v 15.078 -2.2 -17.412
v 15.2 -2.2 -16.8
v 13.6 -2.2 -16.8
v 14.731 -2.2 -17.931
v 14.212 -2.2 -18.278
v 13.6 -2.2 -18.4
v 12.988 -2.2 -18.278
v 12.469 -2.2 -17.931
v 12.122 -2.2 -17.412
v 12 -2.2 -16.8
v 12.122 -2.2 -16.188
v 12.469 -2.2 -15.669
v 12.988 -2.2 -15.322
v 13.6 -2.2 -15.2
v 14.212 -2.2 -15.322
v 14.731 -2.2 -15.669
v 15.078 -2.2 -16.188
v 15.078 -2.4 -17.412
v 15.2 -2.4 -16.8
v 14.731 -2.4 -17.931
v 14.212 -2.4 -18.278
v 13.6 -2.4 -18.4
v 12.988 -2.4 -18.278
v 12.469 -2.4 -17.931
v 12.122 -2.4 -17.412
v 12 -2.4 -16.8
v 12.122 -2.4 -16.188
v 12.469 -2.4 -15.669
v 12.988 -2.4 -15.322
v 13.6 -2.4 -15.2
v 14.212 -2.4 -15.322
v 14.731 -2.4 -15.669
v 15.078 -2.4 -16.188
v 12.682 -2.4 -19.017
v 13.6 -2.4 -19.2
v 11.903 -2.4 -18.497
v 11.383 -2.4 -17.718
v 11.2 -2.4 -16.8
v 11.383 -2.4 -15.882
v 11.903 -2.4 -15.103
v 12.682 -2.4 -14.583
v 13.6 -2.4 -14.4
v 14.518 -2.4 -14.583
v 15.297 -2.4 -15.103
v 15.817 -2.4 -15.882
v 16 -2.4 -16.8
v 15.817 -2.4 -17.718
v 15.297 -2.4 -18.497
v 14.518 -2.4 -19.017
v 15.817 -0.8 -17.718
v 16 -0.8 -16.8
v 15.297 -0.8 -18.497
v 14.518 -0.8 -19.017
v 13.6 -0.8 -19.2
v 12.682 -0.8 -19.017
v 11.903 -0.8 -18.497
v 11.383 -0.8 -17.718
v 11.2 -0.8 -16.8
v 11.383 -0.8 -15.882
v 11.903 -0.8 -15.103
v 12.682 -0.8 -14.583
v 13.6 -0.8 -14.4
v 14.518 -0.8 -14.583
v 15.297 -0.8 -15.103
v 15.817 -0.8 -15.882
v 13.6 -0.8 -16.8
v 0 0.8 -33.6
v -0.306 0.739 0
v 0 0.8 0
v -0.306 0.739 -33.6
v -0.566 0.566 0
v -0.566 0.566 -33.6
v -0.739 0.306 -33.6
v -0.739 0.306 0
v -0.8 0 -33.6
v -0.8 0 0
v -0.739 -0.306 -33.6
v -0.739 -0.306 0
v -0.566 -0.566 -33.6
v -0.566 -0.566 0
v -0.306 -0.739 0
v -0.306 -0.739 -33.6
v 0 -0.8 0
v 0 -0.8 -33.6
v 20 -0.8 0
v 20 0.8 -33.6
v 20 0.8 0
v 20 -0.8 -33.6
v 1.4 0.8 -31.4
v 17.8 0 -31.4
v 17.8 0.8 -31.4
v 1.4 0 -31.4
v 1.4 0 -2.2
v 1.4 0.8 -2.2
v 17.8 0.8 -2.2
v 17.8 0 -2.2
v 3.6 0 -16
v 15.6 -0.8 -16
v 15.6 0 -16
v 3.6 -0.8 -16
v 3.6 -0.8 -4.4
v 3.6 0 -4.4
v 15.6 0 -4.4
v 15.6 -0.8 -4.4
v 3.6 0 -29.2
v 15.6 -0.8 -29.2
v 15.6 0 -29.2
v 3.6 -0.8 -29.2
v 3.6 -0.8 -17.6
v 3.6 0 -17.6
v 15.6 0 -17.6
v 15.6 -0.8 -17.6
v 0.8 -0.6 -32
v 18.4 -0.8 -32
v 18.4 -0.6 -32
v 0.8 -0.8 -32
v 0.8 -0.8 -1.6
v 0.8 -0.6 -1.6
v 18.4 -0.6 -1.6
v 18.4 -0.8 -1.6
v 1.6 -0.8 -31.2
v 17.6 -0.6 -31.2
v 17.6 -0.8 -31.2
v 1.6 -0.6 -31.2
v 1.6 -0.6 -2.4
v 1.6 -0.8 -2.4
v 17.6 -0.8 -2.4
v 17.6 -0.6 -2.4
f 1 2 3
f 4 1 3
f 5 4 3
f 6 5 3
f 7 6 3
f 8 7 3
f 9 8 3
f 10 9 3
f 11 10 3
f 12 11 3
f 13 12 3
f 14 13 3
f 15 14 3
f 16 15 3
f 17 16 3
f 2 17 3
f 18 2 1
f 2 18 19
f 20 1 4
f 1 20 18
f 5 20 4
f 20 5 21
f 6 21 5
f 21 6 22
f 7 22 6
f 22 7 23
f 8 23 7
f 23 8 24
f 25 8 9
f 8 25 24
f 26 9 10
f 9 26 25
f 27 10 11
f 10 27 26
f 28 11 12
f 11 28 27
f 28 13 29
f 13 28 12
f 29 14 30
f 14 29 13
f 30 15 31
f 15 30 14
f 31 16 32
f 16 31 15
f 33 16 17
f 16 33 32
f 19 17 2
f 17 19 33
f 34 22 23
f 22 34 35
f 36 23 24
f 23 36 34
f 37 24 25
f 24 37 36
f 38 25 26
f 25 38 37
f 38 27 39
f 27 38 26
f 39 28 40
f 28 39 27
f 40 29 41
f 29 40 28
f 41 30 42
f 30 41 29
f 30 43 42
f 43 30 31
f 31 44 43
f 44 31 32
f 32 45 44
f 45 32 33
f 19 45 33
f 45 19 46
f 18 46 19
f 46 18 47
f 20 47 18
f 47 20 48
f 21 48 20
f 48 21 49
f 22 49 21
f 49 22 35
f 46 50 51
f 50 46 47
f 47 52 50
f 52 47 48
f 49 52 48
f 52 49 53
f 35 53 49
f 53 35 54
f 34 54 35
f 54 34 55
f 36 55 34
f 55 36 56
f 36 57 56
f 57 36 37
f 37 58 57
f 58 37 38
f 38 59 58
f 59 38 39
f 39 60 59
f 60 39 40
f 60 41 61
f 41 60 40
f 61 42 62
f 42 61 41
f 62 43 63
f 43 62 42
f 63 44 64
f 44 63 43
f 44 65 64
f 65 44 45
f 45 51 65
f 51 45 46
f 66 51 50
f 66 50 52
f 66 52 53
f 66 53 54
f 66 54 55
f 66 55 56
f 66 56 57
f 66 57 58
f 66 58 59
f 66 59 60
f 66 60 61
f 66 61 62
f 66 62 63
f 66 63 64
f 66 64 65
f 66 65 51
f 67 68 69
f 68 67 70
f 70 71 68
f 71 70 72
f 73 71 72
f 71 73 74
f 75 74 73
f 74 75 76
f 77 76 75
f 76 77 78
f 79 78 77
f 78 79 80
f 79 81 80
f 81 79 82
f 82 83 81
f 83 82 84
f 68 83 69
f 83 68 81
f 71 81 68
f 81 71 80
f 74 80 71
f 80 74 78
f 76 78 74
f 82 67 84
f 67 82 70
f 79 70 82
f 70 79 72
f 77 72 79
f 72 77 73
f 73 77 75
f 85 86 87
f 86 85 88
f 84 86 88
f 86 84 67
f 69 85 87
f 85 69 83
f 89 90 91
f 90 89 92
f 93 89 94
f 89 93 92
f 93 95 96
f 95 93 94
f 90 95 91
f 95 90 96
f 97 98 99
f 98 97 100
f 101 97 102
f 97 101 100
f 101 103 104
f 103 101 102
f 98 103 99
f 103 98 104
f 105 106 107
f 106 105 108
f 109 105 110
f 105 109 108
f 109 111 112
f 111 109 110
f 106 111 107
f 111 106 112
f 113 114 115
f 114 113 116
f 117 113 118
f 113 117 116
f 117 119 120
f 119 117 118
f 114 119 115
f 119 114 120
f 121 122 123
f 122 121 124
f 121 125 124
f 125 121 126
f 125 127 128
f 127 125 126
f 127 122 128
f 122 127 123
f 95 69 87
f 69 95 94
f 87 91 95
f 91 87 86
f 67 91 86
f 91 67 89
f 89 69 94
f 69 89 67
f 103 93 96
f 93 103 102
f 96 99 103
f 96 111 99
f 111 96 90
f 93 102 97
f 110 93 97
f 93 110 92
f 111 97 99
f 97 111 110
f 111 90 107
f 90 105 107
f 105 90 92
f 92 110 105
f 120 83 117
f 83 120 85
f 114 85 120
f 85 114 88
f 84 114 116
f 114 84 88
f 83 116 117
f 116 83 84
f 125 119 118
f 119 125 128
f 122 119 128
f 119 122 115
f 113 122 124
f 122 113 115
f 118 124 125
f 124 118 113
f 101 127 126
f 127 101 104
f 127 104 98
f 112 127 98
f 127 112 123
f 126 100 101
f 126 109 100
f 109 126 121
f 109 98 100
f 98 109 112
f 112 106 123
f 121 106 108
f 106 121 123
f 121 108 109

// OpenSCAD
// file: ../p/4-4edge.scad
use <../lib.scad>
function ldraw_lib__4_4edge() = [
// 0 Circle 1.0
// 0 Name: 4-4edge.dat
// 0 Author: James Jessiman
// 0 !LDRAW_ORG Primitive UPDATE 2017-01
// 0 !LICENSE Licensed under CC BY 4.0 : see CAreadme.txt
// 
// 0 BFC CERTIFY CCW
  [0,"BFC","CERTIFY"],
  [0,"BFC","CCW"],
// 
// 0 !HISTORY 1998-12-15 [PTadmin] Official Update 1998-10
// 0 !HISTORY 2005-12-28 [PTadmin] Official Update 2005-01
// 0 !HISTORY 2007-06-24 [PTadmin] Header formatted for Contributor Agreement
// 0 !HISTORY 2008-07-01 [PTadmin] Official Update 2008-01
// 0 !HISTORY 2017-01-15 [Steffen] BFCed
// 0 !HISTORY 2017-12-30 [PTadmin] Official Update 2017-01
// 
// 
// 2 24 1 0 0 0.9239 0 0.3827
  [2,24,1,0,0,0.9239,0,0.3827],
// 2 24 0.9239 0 0.3827 0.7071 0 0.7071
  [2,24,0.9239,0,0.3827,0.7071,0,0.7071],
// 2 24 0.7071 0 0.7071 0.3827 0 0.9239
  [2,24,0.7071,0,0.7071,0.3827,0,0.9239],
// 2 24 0.3827 0 0.9239 0 0 1
  [2,24,0.3827,0,0.9239,0,0,1],
// 2 24 0 0 1 -0.3827 0 0.9239
  [2,24,0,0,1,-0.3827,0,0.9239],
// 2 24 -0.3827 0 0.9239 -0.7071 0 0.7071
  [2,24,-0.3827,0,0.9239,-0.7071,0,0.7071],
// 2 24 -0.7071 0 0.7071 -0.9239 0 0.3827
  [2,24,-0.7071,0,0.7071,-0.9239,0,0.3827],
// 2 24 -0.9239 0 0.3827 -1 0 -0
  [2,24,-0.9239,0,0.3827,-1,0,-0],
// 2 24 -1 0 -0 -0.9239 0 -0.3827
  [2,24,-1,0,-0,-0.9239,0,-0.3827],
// 2 24 -0.9239 0 -0.3827 -0.7071 0 -0.7071
  [2,24,-0.9239,0,-0.3827,-0.7071,0,-0.7071],
// 2 24 -0.7071 0 -0.7071 -0.3827 0 -0.9239
  [2,24,-0.7071,0,-0.7071,-0.3827,0,-0.9239],
// 2 24 -0.3827 0 -0.9239 0 0 -1
  [2,24,-0.3827,0,-0.9239,0,0,-1],
// 2 24 0 0 -1 0.3827 0 -0.9239
  [2,24,0,0,-1,0.3827,0,-0.9239],
// 2 24 0.3827 0 -0.9239 0.7071 0 -0.7071
  [2,24,0.3827,0,-0.9239,0.7071,0,-0.7071],
// 2 24 0.7071 0 -0.7071 0.9239 0 -0.3827
  [2,24,0.7071,0,-0.7071,0.9239,0,-0.3827],
// 2 24 0.9239 0 -0.3827 1 0 0
  [2,24,0.9239,0,-0.3827,1,0,0],
];
module ldraw_lib__4_4edge(step=0, col=false, unit=2/5, alt=false, line=0.2, solid=!$preview)
    makepoly(ldraw_lib__4_4edge(), step=step, col=col, unit=unit, alt=alt, line=line, solid=solid);
ldraw_lib__4_4edge(line=0.2);
// file: ../p/4-4cyli.scad
use <../lib.scad>
function ldraw_lib__4_4cyli() = [
// 0 Cylinder 1.0
// 0 Name: 4-4cyli.dat
// 0 Author: James Jessiman
// 0 !LDRAW_ORG Primitive UPDATE 2005-01
// 0 !LICENSE Licensed under CC BY 4.0 : see CAreadme.txt
// 
// 0 BFC CERTIFY CCW
  [0,"BFC","CERTIFY"],
  [0,"BFC","CCW"],
// 
// 0 !HISTORY 1998-12-15 [PTadmin] Official Update 1998-10
// 0 !HISTORY 2002-03-23 [sbliss] Added BFC statement; merged headers from files in distributions LDraw 0.27 and Complete.
// 0 !HISTORY 2002-04-25 [PTadmin] Official Update 2002-02
// 0 !HISTORY 2004-12-14 [guyvivan] BFC CCW
// 0 !HISTORY 2005-12-28 [PTadmin] Official Update 2005-01
// 0 !HISTORY 2007-06-24 [PTadmin] Header formatted for Contributor Agreement
// 0 !HISTORY 2008-07-01 [PTadmin] Official Update 2008-01
// 
// 
// 4 16 1 1 0 0.9239 1 0.3827 0.9239 0 0.3827 1 0 0
  [4,16,1,1,0,0.9239,1,0.3827,0.9239,0,0.3827,1,0,0],
// 5 24 1 0 0 1 1 0 0.9239 0 0.3827 0.9239 0 -0.3827
  [5,24,1,0,0,1,1,0,0.9239,0,0.3827,0.9239,0,-0.3827],
// 4 16 0.9239 1 0.3827 0.7071 1 0.7071 0.7071 0 0.7071 0.9239 0 0.3827
  [4,16,0.9239,1,0.3827,0.7071,1,0.7071,0.7071,0,0.7071,0.9239,0,0.3827],
// 5 24 0.9239 0 0.3827 0.9239 1 0.3827 0.7071 0 0.7071 1 0 0
  [5,24,0.9239,0,0.3827,0.9239,1,0.3827,0.7071,0,0.7071,1,0,0],
// 4 16 0.7071 1 0.7071 0.3827 1 0.9239 0.3827 0 0.9239 0.7071 0 0.7071
  [4,16,0.7071,1,0.7071,0.3827,1,0.9239,0.3827,0,0.9239,0.7071,0,0.7071],
// 5 24 0.7071 0 0.7071 0.7071 1 0.7071 0.3827 0 0.9239 0.9239 0 0.3827
  [5,24,0.7071,0,0.7071,0.7071,1,0.7071,0.3827,0,0.9239,0.9239,0,0.3827],
// 4 16 0.3827 1 0.9239 0 1 1 0 0 1 0.3827 0 0.9239
  [4,16,0.3827,1,0.9239,0,1,1,0,0,1,0.3827,0,0.9239],
// 5 24 0.3827 0 0.9239 0.3827 1 0.9239 0 0 1 0.7071 0 0.7071
  [5,24,0.3827,0,0.9239,0.3827,1,0.9239,0,0,1,0.7071,0,0.7071],
// 4 16 0 1 1 -0.3827 1 0.9239 -0.3827 0 0.9239 0 0 1
  [4,16,0,1,1,-0.3827,1,0.9239,-0.3827,0,0.9239,0,0,1],
// 5 24 0 0 1 0 1 1 -0.3827 0 0.9239 0.3827 0 0.9239
  [5,24,0,0,1,0,1,1,-0.3827,0,0.9239,0.3827,0,0.9239],
// 4 16 -0.3827 1 0.9239 -0.7071 1 0.7071 -0.7071 0 0.7071 -0.3827 0 0.9239
  [4,16,-0.3827,1,0.9239,-0.7071,1,0.7071,-0.7071,0,0.7071,-0.3827,0,0.9239],
// 5 24 -0.3827 0 0.9239 -0.3827 1 0.9239 -0.7071 0 0.7071 0 0 1
  [5,24,-0.3827,0,0.9239,-0.3827,1,0.9239,-0.7071,0,0.7071,0,0,1],
// 4 16 -0.7071 1 0.7071 -0.9239 1 0.3827 -0.9239 0 0.3827 -0.7071 0 0.7071
  [4,16,-0.7071,1,0.7071,-0.9239,1,0.3827,-0.9239,0,0.3827,-0.7071,0,0.7071],
// 5 24 -0.7071 0 0.7071 -0.7071 1 0.7071 -0.9239 0 0.3827 -0.3827 0 0.9239
  [5,24,-0.7071,0,0.7071,-0.7071,1,0.7071,-0.9239,0,0.3827,-0.3827,0,0.9239],
// 4 16 -0.9239 1 0.3827 -1 1 0 -1 0 0 -0.9239 0 0.3827
  [4,16,-0.9239,1,0.3827,-1,1,0,-1,0,0,-0.9239,0,0.3827],
// 5 24 -0.9239 0 0.3827 -0.9239 1 0.3827 -1 0 0 -0.7071 0 0.7071
  [5,24,-0.9239,0,0.3827,-0.9239,1,0.3827,-1,0,0,-0.7071,0,0.7071],
// 4 16 -1 1 0 -0.9239 1 -0.3827 -0.9239 0 -0.3827 -1 0 0
  [4,16,-1,1,0,-0.9239,1,-0.3827,-0.9239,0,-0.3827,-1,0,0],
// 5 24 -1 0 0 -1 1 0 -0.9239 0 -0.3827 -0.9239 0 0.3827
  [5,24,-1,0,0,-1,1,0,-0.9239,0,-0.3827,-0.9239,0,0.3827],
// 4 16 -0.9239 1 -0.3827 -0.7071 1 -0.7071 -0.7071 0 -0.7071 -0.9239 0 -0.3827
  [4,16,-0.9239,1,-0.3827,-0.7071,1,-0.7071,-0.7071,0,-0.7071,-0.9239,0,-0.3827],
// 5 24 -0.9239 0 -0.3827 -0.9239 1 -0.3827 -0.7071 0 -0.7071 -1 0 0
  [5,24,-0.9239,0,-0.3827,-0.9239,1,-0.3827,-0.7071,0,-0.7071,-1,0,0],
// 4 16 -0.7071 1 -0.7071 -0.3827 1 -0.9239 -0.3827 0 -0.9239 -0.7071 0 -0.7071
  [4,16,-0.7071,1,-0.7071,-0.3827,1,-0.9239,-0.3827,0,-0.9239,-0.7071,0,-0.7071],
// 5 24 -0.7071 0 -0.7071 -0.7071 1 -0.7071 -0.3827 0 -0.9239 -0.9239 0 -0.3827
  [5,24,-0.7071,0,-0.7071,-0.7071,1,-0.7071,-0.3827,0,-0.9239,-0.9239,0,-0.3827],
// 4 16 -0.3827 1 -0.9239 0 1 -1 0 0 -1 -0.3827 0 -0.9239
  [4,16,-0.3827,1,-0.9239,0,1,-1,0,0,-1,-0.3827,0,-0.9239],
// 5 24 -0.3827 0 -0.9239 -0.3827 1 -0.9239 0 0 -1 -0.7071 0 -0.7071
  [5,24,-0.3827,0,-0.9239,-0.3827,1,-0.9239,0,0,-1,-0.7071,0,-0.7071],
// 4 16 0 1 -1 0.3827 1 -0.9239 0.3827 0 -0.9239 0 0 -1
  [4,16,0,1,-1,0.3827,1,-0.9239,0.3827,0,-0.9239,0,0,-1],
// 5 24 0 0 -1 0 1 -1 0.3827 0 -0.9239 -0.3827 0 -0.9239
  [5,24,0,0,-1,0,1,-1,0.3827,0,-0.9239,-0.3827,0,-0.9239],
// 4 16 0.3827 1 -0.9239 0.7071 1 -0.7071 0.7071 0 -0.7071 0.3827 0 -0.9239
  [4,16,0.3827,1,-0.9239,0.7071,1,-0.7071,0.7071,0,-0.7071,0.3827,0,-0.9239],
// 5 24 0.3827 0 -0.9239 0.3827 1 -0.9239 0.7071 0 -0.7071 0 0 -1
  [5,24,0.3827,0,-0.9239,0.3827,1,-0.9239,0.7071,0,-0.7071,0,0,-1],
// 4 16 0.7071 1 -0.7071 0.9239 1 -0.3827 0.9239 0 -0.3827 0.7071 0 -0.7071
  [4,16,0.7071,1,-0.7071,0.9239,1,-0.3827,0.9239,0,-0.3827,0.7071,0,-0.7071],
// 5 24 0.7071 0 -0.7071 0.7071 1 -0.7071 0.9239 0 -0.3827 0.3827 0 -0.9239
  [5,24,0.7071,0,-0.7071,0.7071,1,-0.7071,0.9239,0,-0.3827,0.3827,0,-0.9239],
// 4 16 0.9239 1 -0.3827 1 1 0 1 0 0 0.9239 0 -0.3827
  [4,16,0.9239,1,-0.3827,1,1,0,1,0,0,0.9239,0,-0.3827],
// 5 24 0.9239 0 -0.3827 0.9239 1 -0.3827 1 0 0 0.7071 0 -0.7071
  [5,24,0.9239,0,-0.3827,0.9239,1,-0.3827,1,0,0,0.7071,0,-0.7071],
// 0
];
module ldraw_lib__4_4cyli(step=0, col=false, unit=2/5, alt=false, line=0.2, solid=!$preview)
    makepoly(ldraw_lib__4_4cyli(), step=step, col=col, unit=unit, alt=alt, line=line, solid=solid);
ldraw_lib__4_4cyli(line=0.2);
// file: ../p/2-4edge.scad
use <../lib.scad>
function ldraw_lib__2_4edge() = [
// 0 Circle 0.5
// 0 Name: 2-4edge.dat
// 0 Author: James Jessiman
// 0 !LDRAW_ORG Primitive UPDATE 2017-01
// 0 !LICENSE Licensed under CC BY 4.0 : see CAreadme.txt
// 
// 0 BFC CERTIFY CCW
  [0,"BFC","CERTIFY"],
  [0,"BFC","CCW"],
// 
// 0 !HISTORY 2007-06-24 [PTadmin] Header formatted for Contributor Agreement
// 0 !HISTORY 2008-07-01 [PTadmin] Official Update 2008-01
// 0 !HISTORY 2017-01-15 [Steffen] BFCed
// 0 !HISTORY 2017-12-30 [PTadmin] Official Update 2017-01
// 
// 
// 2 24 1 0 0 0.9239 0 0.3827
  [2,24,1,0,0,0.9239,0,0.3827],
// 2 24 0.9239 0 0.3827 0.7071 0 0.7071
  [2,24,0.9239,0,0.3827,0.7071,0,0.7071],
// 2 24 0.7071 0 0.7071 0.3827 0 0.9239
  [2,24,0.7071,0,0.7071,0.3827,0,0.9239],
// 2 24 0.3827 0 0.9239 0 0 1
  [2,24,0.3827,0,0.9239,0,0,1],
// 2 24 0 0 1 -0.3827 0 0.9239
  [2,24,0,0,1,-0.3827,0,0.9239],
// 2 24 -0.3827 0 0.9239 -0.7071 0 0.7071
  [2,24,-0.3827,0,0.9239,-0.7071,0,0.7071],
// 2 24 -0.7071 0 0.7071 -0.9239 0 0.3827
  [2,24,-0.7071,0,0.7071,-0.9239,0,0.3827],
// 2 24 -0.9239 0 0.3827 -1 0 0
  [2,24,-0.9239,0,0.3827,-1,0,0],
];
module ldraw_lib__2_4edge(step=0, col=false, unit=2/5, alt=false, line=0.2, solid=!$preview)
    makepoly(ldraw_lib__2_4edge(), step=step, col=col, unit=unit, alt=alt, line=line, solid=solid);
ldraw_lib__2_4edge(line=0.2);
// file: ../p/2-4cyli.scad
use <../lib.scad>
function ldraw_lib__2_4cyli() = [
// 0 Cylinder 0.5
// 0 Name: 2-4cyli.dat
// 0 Author: James Jessiman
// 0 !LDRAW_ORG Primitive UPDATE 2005-01
// 0 !LICENSE Licensed under CC BY 4.0 : see CAreadme.txt
// 
// 0 BFC CERTIFY CCW
  [0,"BFC","CERTIFY"],
  [0,"BFC","CCW"],
// 
// 0 !HISTORY 2002-03-23 [sbliss] Added BFC statement; compacted code
// 0 !HISTORY 2002-04-25 [PTadmin] Official Update 2002-02
// 0 !HISTORY 2004-12-11 [nielsk] Recreated using Primitive Generator, Edge lines fixed, BFC changed to CCW
// 0 !HISTORY 2005-12-28 [PTadmin] Official Update 2005-01
// 0 !HISTORY 2007-06-24 [PTadmin] Header formatted for Contributor Agreement
// 0 !HISTORY 2008-07-01 [PTadmin] Official Update 2008-01
// 
// 
// 4 16 .9239 1 .3827 .9239 0 .3827 1 0 0 1 1 0
  [4,16,.9239,1,.3827,.9239,0,.3827,1,0,0,1,1,0],
// 4 16 .7071 1 .7071 .7071 0 .7071 .9239 0 .3827 .9239 1 .3827
  [4,16,.7071,1,.7071,.7071,0,.7071,.9239,0,.3827,.9239,1,.3827],
// 4 16 .3827 1 .9239 .3827 0 .9239 .7071 0 .7071 .7071 1 .7071
  [4,16,.3827,1,.9239,.3827,0,.9239,.7071,0,.7071,.7071,1,.7071],
// 4 16 0 1 1 0 0 1 .3827 0 .9239 .3827 1 .9239
  [4,16,0,1,1,0,0,1,.3827,0,.9239,.3827,1,.9239],
// 4 16 -.3827 1 .9239 -.3827 0 .9239 0 0 1 0 1 1
  [4,16,-.3827,1,.9239,-.3827,0,.9239,0,0,1,0,1,1],
// 4 16 -.7071 1 .7071 -.7071 0 .7071 -.3827 0 .9239 -.3827 1 .9239
  [4,16,-.7071,1,.7071,-.7071,0,.7071,-.3827,0,.9239,-.3827,1,.9239],
// 4 16 -.9239 1 .3827 -.9239 0 .3827 -.7071 0 .7071 -.7071 1 .7071
  [4,16,-.9239,1,.3827,-.9239,0,.3827,-.7071,0,.7071,-.7071,1,.7071],
// 4 16 -1 1 0 -1 0 0 -.9239 0 .3827 -.9239 1 .3827
  [4,16,-1,1,0,-1,0,0,-.9239,0,.3827,-.9239,1,.3827],
// 5 24 1 1 0 1 0 0 1 1 -.4142 .9239 1 .3827
  [5,24,1,1,0,1,0,0,1,1,-.4142,.9239,1,.3827],
// 5 24 .9239 1 .3827 .9239 0 .3827 1 1 0 .7071 1 .7071
  [5,24,.9239,1,.3827,.9239,0,.3827,1,1,0,.7071,1,.7071],
// 5 24 .7071 1 .7071 .7071 0 .7071 .9239 1 .3827 .3827 1 .9239
  [5,24,.7071,1,.7071,.7071,0,.7071,.9239,1,.3827,.3827,1,.9239],
// 5 24 .3827 1 .9239 .3827 0 .9239 .7071 1 .7071 0 1 1
  [5,24,.3827,1,.9239,.3827,0,.9239,.7071,1,.7071,0,1,1],
// 5 24 0 1 1 0 0 1 .3827 1 .9239 -.3827 1 .9239
  [5,24,0,1,1,0,0,1,.3827,1,.9239,-.3827,1,.9239],
// 5 24 -.3827 1 .9239 -.3827 0 .9239 0 1 1 -.7071 1 .7071
  [5,24,-.3827,1,.9239,-.3827,0,.9239,0,1,1,-.7071,1,.7071],
// 5 24 -.7071 1 .7071 -.7071 0 .7071 -.3827 1 .9239 -.9239 1 .3827
  [5,24,-.7071,1,.7071,-.7071,0,.7071,-.3827,1,.9239,-.9239,1,.3827],
// 5 24 -.9239 1 .3827 -.9239 0 .3827 -.7071 1 .7071 -1 1 0
  [5,24,-.9239,1,.3827,-.9239,0,.3827,-.7071,1,.7071,-1,1,0],
// 5 24 -1 1 0 -1 0 0 -.9239 1 .3827 -1 1 -.4142
  [5,24,-1,1,0,-1,0,0,-.9239,1,.3827,-1,1,-.4142],
// 0
];
module ldraw_lib__2_4cyli(step=0, col=false, unit=2/5, alt=false, line=0.2, solid=!$preview)
    makepoly(ldraw_lib__2_4cyli(), step=step, col=col, unit=unit, alt=alt, line=line, solid=solid);
ldraw_lib__2_4cyli(line=0.2);
// file: ../p/box4.scad
use <../lib.scad>
function ldraw_lib__box4() = [
// 0 Box with 4 Faces (2 Parallel Pairs) and All Edges
// 0 Name: box4.dat
// 0 Author: James Jessiman
// 0 !LDRAW_ORG Primitive UPDATE 2012-01
// 0 !LICENSE Licensed under CC BY 4.0 : see CAreadme.txt
// 
// 0 BFC CERTIFY CCW
  [0,"BFC","CERTIFY"],
  [0,"BFC","CCW"],
// 
// 0 !HISTORY 2002-04-03 [sbliss] Modified for BFC compliance
// 0 !HISTORY 2002-04-25 [PTadmin] Official Update 2002-02
// 0 !HISTORY 2007-06-24 [PTadmin] Header formatted for Contributor Agreement
// 0 !HISTORY 2008-07-01 [PTadmin] Official Update 2008-01
// 0 !HISTORY 2012-02-16 [Philo] Changed to CCW
// 0 !HISTORY 2012-03-30 [PTadmin] Official Update 2012-01
// 
// 
// 2 24 1 1 1 -1 1 1
  [2,24,1,1,1,-1,1,1],
// 2 24 -1 1 1 -1 1 -1
  [2,24,-1,1,1,-1,1,-1],
// 2 24 -1 1 -1 1 1 -1
  [2,24,-1,1,-1,1,1,-1],
// 2 24 1 1 -1 1 1 1
  [2,24,1,1,-1,1,1,1],
// 2 24 1 0 1 -1 0 1
  [2,24,1,0,1,-1,0,1],
// 2 24 -1 0 1 -1 0 -1
  [2,24,-1,0,1,-1,0,-1],
// 2 24 -1 0 -1 1 0 -1
  [2,24,-1,0,-1,1,0,-1],
// 2 24 1 0 -1 1 0 1
  [2,24,1,0,-1,1,0,1],
// 2 24 1 0 1 1 1 1
  [2,24,1,0,1,1,1,1],
// 2 24 -1 0 1 -1 1 1
  [2,24,-1,0,1,-1,1,1],
// 2 24 1 0 -1 1 1 -1
  [2,24,1,0,-1,1,1,-1],
// 2 24 -1 0 -1 -1 1 -1
  [2,24,-1,0,-1,-1,1,-1],
// 4 16 -1 1 1 -1 0 1 1 0 1 1 1 1
  [4,16,-1,1,1,-1,0,1,1,0,1,1,1,1],
// 4 16 -1 1 -1 -1 0 -1 -1 0 1 -1 1 1
  [4,16,-1,1,-1,-1,0,-1,-1,0,1,-1,1,1],
// 4 16 1 1 -1 1 0 -1 -1 0 -1 -1 1 -1
  [4,16,1,1,-1,1,0,-1,-1,0,-1,-1,1,-1],
// 4 16 1 1 1 1 0 1 1 0 -1 1 1 -1
  [4,16,1,1,1,1,0,1,1,0,-1,1,1,-1],
];
module ldraw_lib__box4(step=0, col=false, unit=2/5, alt=false, line=0.2, solid=!$preview)
    makepoly(ldraw_lib__box4(), step=step, col=col, unit=unit, alt=alt, line=line, solid=solid);
ldraw_lib__box4(line=0.2);
// file: ../p/box3u4a.scad
use <../lib.scad>
function ldraw_lib__box3u4a() = [
// 0 Box with 3 Faces without 4 Adjacent Edges
// 0 Name: box3u4a.dat
// 0 Author: Niels Karsdorp [nielsk]
// 0 !LDRAW_ORG Primitive UPDATE 2009-01
// 0 !LICENSE Licensed under CC BY 4.0 : see CAreadme.txt
// 
// 0 BFC CERTIFY CCW
  [0,"BFC","CERTIFY"],
  [0,"BFC","CCW"],
// 
// 0 !HISTORY 2009-05-02 [PTadmin] Official Update 2009-01
// 
// 
// 2 24 1 1 1 -1 1 1
  [2,24,1,1,1,-1,1,1],
// 2 24 -1 1 -1 1 1 -1
  [2,24,-1,1,-1,1,1,-1],
// 2 24 1 1 1 1 1 -1
  [2,24,1,1,1,1,1,-1],
// 2 24 -1 1 1 -1 1 -1
  [2,24,-1,1,1,-1,1,-1],
// 2 24 1 1 1 1 0 1
  [2,24,1,1,1,1,0,1],
// 2 24 1 1 -1 1 0 -1
  [2,24,1,1,-1,1,0,-1],
// 2 24 -1 1 1 -1 0 1
  [2,24,-1,1,1,-1,0,1],
// 2 24 -1 1 -1 -1 0 -1
  [2,24,-1,1,-1,-1,0,-1],
// 4 16 -1 1 -1 -1 1 1 1 1 1 1 1 -1
  [4,16,-1,1,-1,-1,1,1,1,1,1,1,1,-1],
// 4 16 -1 1 1 -1 0 1 1 0 1 1 1 1
  [4,16,-1,1,1,-1,0,1,1,0,1,1,1,1],
// 4 16 1 1 -1 1 0 -1 -1 0 -1 -1 1 -1
  [4,16,1,1,-1,1,0,-1,-1,0,-1,-1,1,-1],
// 0
];
module ldraw_lib__box3u4a(step=0, col=false, unit=2/5, alt=false, line=0.2, solid=!$preview)
    makepoly(ldraw_lib__box3u4a(), step=step, col=col, unit=unit, alt=alt, line=line, solid=solid);
ldraw_lib__box3u4a(line=0.2);
// file: ../p/4-4ring2.scad
use <../lib.scad>
function ldraw_lib__4_4ring2() = [
// 0 Ring  2 x 1.0
// 0 Name: 4-4ring2.dat
// 0 Author: James Jessiman
// 0 !LDRAW_ORG Primitive UPDATE 2009-01
// 0 !LICENSE Licensed under CC BY 4.0 : see CAreadme.txt
// 
// 0 BFC CERTIFY CCW
  [0,"BFC","CERTIFY"],
  [0,"BFC","CCW"],
// 
// 0 !HISTORY 1998-12-15 [PTadmin] Official Update 1998-10
// 0 !HISTORY 2002-04-05 [hafhead] Added BFC statement
// 0 !HISTORY 2002-04-25 [PTadmin] Official Update 2002-02
// 0 !HISTORY 2007-06-24 [PTadmin] Header formatted for Contributor Agreement
// 0 !HISTORY 2008-07-01 [PTadmin] Official Update 2008-01
// 0 !HISTORY 2008-08-26 [cwdee] Switch polygon winding and rename
// 0 !HISTORY 2009-05-02 [PTadmin] Official Update 2009-01
// 
// 
// 4 16 -1.1481 0 2.7717 -0.7654 0 1.8478 0 0 2 0 0 3
  [4,16,-1.1481,0,2.7717,-0.7654,0,1.8478,0,0,2,0,0,3],
// 4 16 -2.1213 0 2.1213 -1.4142 0 1.4142 -0.7654 0 1.8478 -1.1481 0 2.7717
  [4,16,-2.1213,0,2.1213,-1.4142,0,1.4142,-0.7654,0,1.8478,-1.1481,0,2.7717],
// 4 16 -2.7717 0 1.1481 -1.8478 0 0.7654 -1.4142 0 1.4142 -2.1213 0 2.1213
  [4,16,-2.7717,0,1.1481,-1.8478,0,0.7654,-1.4142,0,1.4142,-2.1213,0,2.1213],
// 4 16 -3 0 0 -2 0 0 -1.8478 0 0.7654 -2.7717 0 1.1481
  [4,16,-3,0,0,-2,0,0,-1.8478,0,0.7654,-2.7717,0,1.1481],
// 4 16 -2.7717 0 -1.1481 -1.8478 0 -0.7654 -2 0 0 -3 0 0
  [4,16,-2.7717,0,-1.1481,-1.8478,0,-0.7654,-2,0,0,-3,0,0],
// 4 16 -2.1213 0 -2.1213 -1.4142 0 -1.4142 -1.8478 0 -0.7654 -2.7717 0 -1.1481
  [4,16,-2.1213,0,-2.1213,-1.4142,0,-1.4142,-1.8478,0,-0.7654,-2.7717,0,-1.1481],
// 4 16 -1.1481 0 -2.7717 -0.7654 0 -1.8478 -1.4142 0 -1.4142 -2.1213 0 -2.1213
  [4,16,-1.1481,0,-2.7717,-0.7654,0,-1.8478,-1.4142,0,-1.4142,-2.1213,0,-2.1213],
// 4 16 0 0 -3 0 0 -2 -0.7654 0 -1.8478 -1.1481 0 -2.7717
  [4,16,0,0,-3,0,0,-2,-0.7654,0,-1.8478,-1.1481,0,-2.7717],
// 4 16 1.1481 0 -2.7717 0.7654 0 -1.8478 0 0 -2 0 0 -3
  [4,16,1.1481,0,-2.7717,0.7654,0,-1.8478,0,0,-2,0,0,-3],
// 4 16 2.1213 0 -2.1213 1.4142 0 -1.4142 0.7654 0 -1.8478 1.1481 0 -2.7717
  [4,16,2.1213,0,-2.1213,1.4142,0,-1.4142,0.7654,0,-1.8478,1.1481,0,-2.7717],
// 4 16 2.7717 0 -1.1481 1.8478 0 -0.7654 1.4142 0 -1.4142 2.1213 0 -2.1213
  [4,16,2.7717,0,-1.1481,1.8478,0,-0.7654,1.4142,0,-1.4142,2.1213,0,-2.1213],
// 4 16 3 0 0 2 0 0 1.8478 0 -0.7654 2.7717 0 -1.1481
  [4,16,3,0,0,2,0,0,1.8478,0,-0.7654,2.7717,0,-1.1481],
// 4 16 2.7717 0 1.1481 1.8478 0 0.7654 2 0 0 3 0 0
  [4,16,2.7717,0,1.1481,1.8478,0,0.7654,2,0,0,3,0,0],
// 4 16 2.1213 0 2.1213 1.4142 0 1.4142 1.8478 0 0.7654 2.7717 0 1.1481
  [4,16,2.1213,0,2.1213,1.4142,0,1.4142,1.8478,0,0.7654,2.7717,0,1.1481],
// 4 16 1.1481 0 2.7717 0.7654 0 1.8478 1.4142 0 1.4142 2.1213 0 2.1213
  [4,16,1.1481,0,2.7717,0.7654,0,1.8478,1.4142,0,1.4142,2.1213,0,2.1213],
// 4 16 0 0 3 0 0 2 0.7654 0 1.8478 1.1481 0 2.7717
  [4,16,0,0,3,0,0,2,0.7654,0,1.8478,1.1481,0,2.7717],
// 0
];
module ldraw_lib__4_4ring2(step=0, col=false, unit=2/5, alt=false, line=0.2, solid=!$preview)
    makepoly(ldraw_lib__4_4ring2(), step=step, col=col, unit=unit, alt=alt, line=line, solid=solid);
ldraw_lib__4_4ring2(line=0.2);
// file: ../p/4-4disc.scad
use <../lib.scad>
function ldraw_lib__4_4disc() = [
// 0 Disc 1.0
// 0 Name: 4-4disc.dat
// 0 Author: James Jessiman
// 0 !LDRAW_ORG Primitive UPDATE 2002-02
// 0 !LICENSE Licensed under CC BY 4.0 : see CAreadme.txt
// 
// 0 BFC CERTIFY CCW
  [0,"BFC","CERTIFY"],
  [0,"BFC","CCW"],
// 
// 0 !HISTORY 1998-12-15 [PTadmin] Official Update 1998-10
// 0 !HISTORY 2002-03-23 [sbliss] Added BFC statement
// 0 !HISTORY 2002-04-25 [PTadmin] Official Update 2002-02
// 0 !HISTORY 2007-06-24 [PTadmin] Header formatted for Contributor Agreement
// 0 !HISTORY 2008-07-01 [PTadmin] Official Update 2008-01
// 
// 
// 3 16 0 0 0 1 0 0 0.9239 0 0.3827
  [3,16,0,0,0,1,0,0,0.9239,0,0.3827],
// 3 16 0 0 0 0.9239 0 0.3827 0.7071 0 0.7071
  [3,16,0,0,0,0.9239,0,0.3827,0.7071,0,0.7071],
// 3 16 0 0 0 0.7071 0 0.7071 0.3827 0 0.9239
  [3,16,0,0,0,0.7071,0,0.7071,0.3827,0,0.9239],
// 3 16 0 0 0 0.3827 0 0.9239 0 0 1
  [3,16,0,0,0,0.3827,0,0.9239,0,0,1],
// 3 16 0 0 0 0 0 1 -0.3827 0 0.9239
  [3,16,0,0,0,0,0,1,-0.3827,0,0.9239],
// 3 16 0 0 0 -0.3827 0 0.9239 -0.7071 0 0.7071
  [3,16,0,0,0,-0.3827,0,0.9239,-0.7071,0,0.7071],
// 3 16 0 0 0 -0.7071 0 0.7071 -0.9239 0 0.3827
  [3,16,0,0,0,-0.7071,0,0.7071,-0.9239,0,0.3827],
// 3 16 0 0 0 -0.9239 0 0.3827 -1 0 -0
  [3,16,0,0,0,-0.9239,0,0.3827,-1,0,-0],
// 3 16 0 0 0 -1 0 -0 -0.9239 0 -0.3827
  [3,16,0,0,0,-1,0,-0,-0.9239,0,-0.3827],
// 3 16 0 0 0 -0.9239 0 -0.3827 -0.7071 0 -0.7071
  [3,16,0,0,0,-0.9239,0,-0.3827,-0.7071,0,-0.7071],
// 3 16 0 0 0 -0.7071 0 -0.7071 -0.3827 0 -0.9239
  [3,16,0,0,0,-0.7071,0,-0.7071,-0.3827,0,-0.9239],
// 3 16 0 0 0 -0.3827 0 -0.9239 0 0 -1
  [3,16,0,0,0,-0.3827,0,-0.9239,0,0,-1],
// 3 16 0 0 0 0 0 -1 0.3827 0 -0.9239
  [3,16,0,0,0,0,0,-1,0.3827,0,-0.9239],
// 3 16 0 0 0 0.3827 0 -0.9239 0.7071 0 -0.7071
  [3,16,0,0,0,0.3827,0,-0.9239,0.7071,0,-0.7071],
// 3 16 0 0 0 0.7071 0 -0.7071 0.9239 0 -0.3827
  [3,16,0,0,0,0.7071,0,-0.7071,0.9239,0,-0.3827],
// 3 16 0 0 0 0.9239 0 -0.3827 1 0 0
  [3,16,0,0,0,0.9239,0,-0.3827,1,0,0],
// 0
];
module ldraw_lib__4_4disc(step=0, col=false, unit=2/5, alt=false, line=0.2, solid=!$preview)
    makepoly(ldraw_lib__4_4disc(), step=step, col=col, unit=unit, alt=alt, line=line, solid=solid);
ldraw_lib__4_4disc(line=0.2);
// file: ../p/4-4cylo.scad
use <../lib.scad>
use <4-4cyli.scad>
use <4-4edge.scad>
function ldraw_lib__4_4cylo() = [
// 0 Cylinder Open 1.0
// 0 Name: 4-4cylo.dat
// 0 Author: Mark Kennedy [mkennedy]
// 0 !LDRAW_ORG Primitive UPDATE 2010-01
// 0 !LICENSE Licensed under CC BY 4.0 : see CAreadme.txt
// 
// 0 BFC CERTIFY CCW
  [0,"BFC","CERTIFY"],
  [0,"BFC","CCW"],
// 
// 0 !HISTORY 2010-04-05 [PTadmin] Official Update 2010-01
// 
// 
// 1 16 0 0 0 1 0 0 0 1 0 0 0 1 4-4edge.dat
  [1,16,0,0,0,1,0,0,0,1,0,0,0,1, ldraw_lib__4_4edge()],
// 1 16 0 1 0 1 0 0 0 1 0 0 0 1 4-4edge.dat
  [1,16,0,1,0,1,0,0,0,1,0,0,0,1, ldraw_lib__4_4edge()],
// 1 16 0 0 0 1 0 0 0 1 0 0 0 1 4-4cyli.dat
  [1,16,0,0,0,1,0,0,0,1,0,0,0,1, ldraw_lib__4_4cyli()],
// 0
];
module ldraw_lib__4_4cylo(step=0, col=false, unit=2/5, alt=false, line=0.2, solid=!$preview)
    makepoly(ldraw_lib__4_4cylo(), step=step, col=col, unit=unit, alt=alt, line=line, solid=solid);
ldraw_lib__4_4cylo(line=0.2);
// file: ../p/4-4cylc.scad
use <../lib.scad>
use <4-4cyli.scad>
use <4-4disc.scad>
use <4-4edge.scad>
function ldraw_lib__4_4cylc() = [
// 0 Cylinder Closed 1.0
// 0 Name: 4-4cylc.dat
// 0 Author: Alex Taylor [anathema]
// 0 !LDRAW_ORG Primitive UPDATE 2009-02
// 0 !LICENSE Licensed under CC BY 4.0 : see CAreadme.txt
// 
// 0 BFC CERTIFY CCW
  [0,"BFC","CERTIFY"],
  [0,"BFC","CCW"],
// 
// 0 !HISTORY 2008-12-29 [cwdee] Removed one disc
// 0 !HISTORY 2009-09-03 [PTadmin] Official Update 2009-02
// 
// 
// 1 16 0 0 0 1 0 0 0 1 0 0 0 1 4-4edge.dat
  [1,16,0,0,0,1,0,0,0,1,0,0,0,1, ldraw_lib__4_4edge()],
// 1 16 0 1 0 1 0 0 0 1 0 0 0 1 4-4edge.dat
  [1,16,0,1,0,1,0,0,0,1,0,0,0,1, ldraw_lib__4_4edge()],
// 1 16 0 0 0 1 0 0 0 1 0 0 0 1 4-4disc.dat
  [1,16,0,0,0,1,0,0,0,1,0,0,0,1, ldraw_lib__4_4disc()],
// 1 16 0 0 0 1 0 0 0 1 0 0 0 1 4-4cyli.dat
  [1,16,0,0,0,1,0,0,0,1,0,0,0,1, ldraw_lib__4_4cyli()],
// 0
];
module ldraw_lib__4_4cylc(step=0, col=false, unit=2/5, alt=false, line=0.2, solid=!$preview)
    makepoly(ldraw_lib__4_4cylc(), step=step, col=col, unit=unit, alt=alt, line=line, solid=solid);
ldraw_lib__4_4cylc(line=0.2);
// file: ../p/2-4cylo.scad
use <../lib.scad>
use <2-4cyli.scad>
use <2-4edge.scad>
function ldraw_lib__2_4cylo() = [
// 0 Cylinder Open 0.5
// 0 Name: 2-4cylo.dat
// 0 Author: Max Martin Richter [MMR1988]
// 0 !LDRAW_ORG Primitive UPDATE 2010-03
// 0 !LICENSE Licensed under CC BY 4.0 : see CAreadme.txt
// 
// 0 BFC CERTIFY CCW
  [0,"BFC","CERTIFY"],
  [0,"BFC","CCW"],
// 
// 0 !HISTORY 2010-12-31 [PTadmin] Official Update 2010-03
// 
// 
// 1 16 0 0 0 1 0 0 0 1 0 0 0 1 2-4edge.dat
  [1,16,0,0,0,1,0,0,0,1,0,0,0,1, ldraw_lib__2_4edge()],
// 1 16 0 1 0 1 0 0 0 1 0 0 0 1 2-4edge.dat
  [1,16,0,1,0,1,0,0,0,1,0,0,0,1, ldraw_lib__2_4edge()],
// 1 16 0 0 0 1 0 0 0 1 0 0 0 1 2-4cyli.dat
  [1,16,0,0,0,1,0,0,0,1,0,0,0,1, ldraw_lib__2_4cyli()],
];
module ldraw_lib__2_4cylo(step=0, col=false, unit=2/5, alt=false, line=0.2, solid=!$preview)
    makepoly(ldraw_lib__2_4cylo(), step=step, col=col, unit=unit, alt=alt, line=line, solid=solid);
ldraw_lib__2_4cylo(line=0.2);
// file: ../p/2-4chrd.scad
use <../lib.scad>
function ldraw_lib__2_4chrd() = [
// 0 Chord 0.5
// 0 Name: 2-4chrd.dat
// 0 Author: Philippe Hurbain [Philo]
// 0 !LDRAW_ORG Primitive UPDATE 2014-01
// 0 !LICENSE Licensed under CC BY 4.0 : see CAreadme.txt
// 
// 0 BFC CERTIFY CCW
  [0,"BFC","CERTIFY"],
  [0,"BFC","CCW"],
// 
// 0 !HISTORY 2014-06-21 [PTadmin] Official Update 2014-01
// 
// 
// 4 16 0.9239 0 0.3827 -0.9239 0 0.3827 -1 0 0 1 0 0
  [4,16,0.9239,0,0.3827,-0.9239,0,0.3827,-1,0,0,1,0,0],
// 4 16 0.7071 0 0.7071 -0.7071 0 0.7071 -0.9239 0 0.3827 0.9239 0 0.3827
  [4,16,0.7071,0,0.7071,-0.7071,0,0.7071,-0.9239,0,0.3827,0.9239,0,0.3827],
// 4 16 0.3827 0 0.9239 -0.3827 0 0.9239 -0.7071 0 0.7071 0.7071 0 0.7071
  [4,16,0.3827,0,0.9239,-0.3827,0,0.9239,-0.7071,0,0.7071,0.7071,0,0.7071],
// 3 16 0 0 1 -0.3827 0 0.9239 0.3827 0 0.9239
  [3,16,0,0,1,-0.3827,0,0.9239,0.3827,0,0.9239],
];
module ldraw_lib__2_4chrd(step=0, col=false, unit=2/5, alt=false, line=0.2, solid=!$preview)
    makepoly(ldraw_lib__2_4chrd(), step=step, col=col, unit=unit, alt=alt, line=line, solid=solid);
ldraw_lib__2_4chrd(line=0.2);
// main file
use <../lib.scad>
use <../p/2-4chrd.scad>
use <../p/2-4cylo.scad>
use <../p/4-4cylc.scad>
use <../p/4-4cylo.scad>
use <../p/4-4disc.scad>
use <../p/4-4ring2.scad>
use <../p/box3u4a.scad>
use <../p/box4.scad>
function ldraw_lib__7930() = [
// 0 Door  1 x  3 x  4
// 0 Name: 7930.dat
// 0 Author: James Jessiman
// 0 !LDRAW_ORG Part UPDATE 2026-07
// 0 !LICENSE Licensed under CC BY 4.0 : see CAreadme.txt
// 
// 0 BFC CERTIFY CCW
  [0,"BFC","CERTIFY"],
  [0,"BFC","CCW"],
// 
// 0 !CATEGORY Door
// 0 !KEYWORDS Brickowl 200232
// 
// 0 !HISTORY 1998-06-20 [PTadmin] Official Update 1998-06
// 0 !HISTORY 2003-05-05 [nielsk] BFC Certified, groove added
// 0 !HISTORY 2003-12-19 [PTadmin] Official Update 2003-03
// 0 !HISTORY 2007-07-23 [PTadmin] Header formatted for Contributor Agreement
// 0 !HISTORY 2008-07-01 [PTadmin] Official Update 2008-01
// 0 !HISTORY 2025-09-27 [OrionP] Changed winding to CCW
// 0 !HISTORY 2025-09-29 [OrionP] Official Update 2025-09
// 0 !HISTORY 2026-01-28 [Sirio] Updated the use of primitives: removed ringr.dat or ringrr.dat; changed cyli to cylo; fixed T-junctions
// 0 !HISTORY 2026-07-30 [OrionP] Official Update 2026-07
// 
// 0 // Handle
// 0 // Primitives
// 0 BFC INVERTNEXT
  [0,"BFC","INVERTNEXT"],
// 1 16 34 42 -5.5 4 0 0 0 0 4 0 -.5 0 4-4cylc.dat
  [1,16,34,42,-5.5,4,0,0,0,0,4,0,-.5,0, ldraw_lib__4_4cylc()],
// 1 16 34 42 -6 2 0 0 0 0 2 0 1 0 4-4ring2.dat
  [1,16,34,42,-6,2,0,0,0,0,2,0,1,0, ldraw_lib__4_4ring2()],
// 1 16 34 42 -2 6 0 0 0 0 6 0 -4 0 4-4cylo.dat
  [1,16,34,42,-2,6,0,0,0,0,6,0,-4,0, ldraw_lib__4_4cylo()],
// 1 16 34 42 -2 6 0 0 0 0 6 0 -1 0 4-4disc.dat
  [1,16,34,42,-2,6,0,0,0,0,6,0,-1,0, ldraw_lib__4_4disc()],
// 0 // Frame
// 0 // Primitives
// 1 16 0 0 0 0 0 -2 0 84 0 2 0 0 2-4cylo.dat
  [1,16,0,0,0,0,0,-2,0,84,0,2,0,0, ldraw_lib__2_4cylo()],
// 1 16 0 0 0 0 0 -2 0 1 0 2 0 0 2-4chrd.dat
  [1,16,0,0,0,0,0,-2,0,1,0,2,0,0, ldraw_lib__2_4chrd()],
// 1 16 0 84 0 0 0 -2 0 -1 0 2 0 0 2-4chrd.dat
  [1,16,0,84,0,0,0,-2,0,-1,0,2,0,0, ldraw_lib__2_4chrd()],
// 1 16 0 42 0 0 50 0 0 0 42 2 0 0 box3u4a.dat
  [1,16,0,42,0,0,50,0,0,0,42,2,0,0, ldraw_lib__box3u4a()],
// 0 BFC INVERTNEXT
  [0,"BFC","INVERTNEXT"],
// 1 16 24 42 0 20.5 0 0 0 0 36.5 0 2 0 box4.dat
  [1,16,24,42,0,20.5,0,0,0,0,36.5,0,2,0, ldraw_lib__box4()],
// 0 BFC INVERTNEXT
  [0,"BFC","INVERTNEXT"],
// 1 16 24 25.5 -2 15 0 0 0 0 14.5 0 2 0 box4.dat
  [1,16,24,25.5,-2,15,0,0,0,0,14.5,0,2,0, ldraw_lib__box4()],
// 0 BFC INVERTNEXT
  [0,"BFC","INVERTNEXT"],
// 1 16 24 58.5 -2 15 0 0 0 0 14.5 0 2 0 box4.dat
  [1,16,24,58.5,-2,15,0,0,0,0,14.5,0,2,0, ldraw_lib__box4()],
// 0 BFC INVERTNEXT
  [0,"BFC","INVERTNEXT"],
// 1 16 24 42 -2 22 0 0 0 0 38 0 0.5 0 box4.dat
  [1,16,24,42,-2,22,0,0,0,0,38,0,0.5,0, ldraw_lib__box4()],
// 1 16 24 42 -2 20 0 0 0 0 36 0 0.5 0 box4.dat
  [1,16,24,42,-2,20,0,0,0,0,36,0,0.5,0, ldraw_lib__box4()],
// 0 // Faces
// 4 16 44.5 5.5 2 3.5 5.5 2 0 0 2 50 0 2
  [4,16,44.5,5.5,2,3.5,5.5,2,0,0,2,50,0,2],
// 4 16 44.5 5.5 2 50 0 2 50 84 2 44.5 78.5 2
  [4,16,44.5,5.5,2,50,0,2,50,84,2,44.5,78.5,2],
// 4 16 3.5 78.5 2 44.5 78.5 2 50 84 2 0 84 2
  [4,16,3.5,78.5,2,44.5,78.5,2,50,84,2,0,84,2],
// 4 16 3.5 78.5 2 0 84 2 0 0 2 3.5 5.5 2
  [4,16,3.5,78.5,2,0,84,2,0,0,2,3.5,5.5,2],
// 4 16 44.5 5.5 0 39 11 0 9 11 0 3.5 5.5 0
  [4,16,44.5,5.5,0,39,11,0,9,11,0,3.5,5.5,0],
// 3 16 44.5 5.5 0 39 40 0 39 11 0
  [3,16,44.5,5.5,0,39,40,0,39,11,0],
// 4 16 44.5 5.5 0 44.5 78.5 0 39 44 0 39 40 0
  [4,16,44.5,5.5,0,44.5,78.5,0,39,44,0,39,40,0],
// 3 16 3.5 5.5 0 9 11 0 9 40 0
  [3,16,3.5,5.5,0,9,11,0,9,40,0],
// 4 16 3.5 5.5 0 9 40 0 9 44 0 3.5 78.5 0
  [4,16,3.5,5.5,0,9,40,0,9,44,0,3.5,78.5,0],
// 4 16 39 44 0 9 44 0 9 40 0 39 40 0
  [4,16,39,44,0,9,44,0,9,40,0,39,40,0],
// 3 16 39 44 0 44.5 78.5 0 39 73 0
  [3,16,39,44,0,44.5,78.5,0,39,73,0],
// 4 16 3.5 78.5 0 9 73 0 39 73 0 44.5 78.5 0
  [4,16,3.5,78.5,0,9,73,0,39,73,0,44.5,78.5,0],
// 3 16 3.5 78.5 0 9 44 0 9 73 0
  [3,16,3.5,78.5,0,9,44,0,9,73,0],
// 4 16 46 4 -2 50 0 -2 0 0 -2 2 4 -2
  [4,16,46,4,-2,50,0,-2,0,0,-2,2,4,-2],
// 4 16 46 4 -2 46 80 -2 50 84 -2 50 0 -2
  [4,16,46,4,-2,46,80,-2,50,84,-2,50,0,-2],
// 4 16 0 84 -2 50 84 -2 46 80 -2 2 80 -2
  [4,16,0,84,-2,50,84,-2,46,80,-2,2,80,-2],
// 4 16 0 84 -2 2 80 -2 2 4 -2 0 0 -2
  [4,16,0,84,-2,2,80,-2,2,4,-2,0,0,-2],
// 4 16 46 4 -1.5 2 4 -1.5 4 6 -1.5 44 6 -1.5
  [4,16,46,4,-1.5,2,4,-1.5,4,6,-1.5,44,6,-1.5],
// 4 16 46 4 -1.5 44 6 -1.5 44 78 -1.5 46 80 -1.5
  [4,16,46,4,-1.5,44,6,-1.5,44,78,-1.5,46,80,-1.5],
// 4 16 2 80 -1.5 46 80 -1.5 44 78 -1.5 4 78 -1.5
  [4,16,2,80,-1.5,46,80,-1.5,44,78,-1.5,4,78,-1.5],
// 4 16 2 80 -1.5 4 78 -1.5 4 6 -1.5 2 4 -1.5
  [4,16,2,80,-1.5,4,78,-1.5,4,6,-1.5,2,4,-1.5],
// 4 16 44 6 -2 4 6 -2 9 11 -2 39 11 -2
  [4,16,44,6,-2,4,6,-2,9,11,-2,39,11,-2],
// 3 16 44 6 -2 39 11 -2 39 40 -2
  [3,16,44,6,-2,39,11,-2,39,40,-2],
// 4 16 44 6 -2 39 40 -2 39 44 -2 44 78 -2
  [4,16,44,6,-2,39,40,-2,39,44,-2,44,78,-2],
// 3 16 4 6 -2 9 40 -2 9 11 -2
  [3,16,4,6,-2,9,40,-2,9,11,-2],
// 4 16 4 6 -2 4 78 -2 9 44 -2 9 40 -2
  [4,16,4,6,-2,4,78,-2,9,44,-2,9,40,-2],
// 4 16 39 44 -2 39 40 -2 9 40 -2 9 44 -2
  [4,16,39,44,-2,39,40,-2,9,40,-2,9,44,-2],
// 3 16 39 44 -2 39 73 -2 44 78 -2
  [3,16,39,44,-2,39,73,-2,44,78,-2],
// 4 16 4 78 -2 44 78 -2 39 73 -2 9 73 -2
  [4,16,4,78,-2,44,78,-2,39,73,-2,9,73,-2],
// 3 16 4 78 -2 9 73 -2 9 44 -2
  [3,16,4,78,-2,9,73,-2,9,44,-2],
];
module ldraw_lib__7930(step=0, col=false, unit=2/5, alt=false, line=0.2, solid=!$preview)
    makepoly(ldraw_lib__7930(), step=step, col=col, unit=unit, alt=alt, line=line, solid=solid);
ldraw_lib__7930(line=0.2);
